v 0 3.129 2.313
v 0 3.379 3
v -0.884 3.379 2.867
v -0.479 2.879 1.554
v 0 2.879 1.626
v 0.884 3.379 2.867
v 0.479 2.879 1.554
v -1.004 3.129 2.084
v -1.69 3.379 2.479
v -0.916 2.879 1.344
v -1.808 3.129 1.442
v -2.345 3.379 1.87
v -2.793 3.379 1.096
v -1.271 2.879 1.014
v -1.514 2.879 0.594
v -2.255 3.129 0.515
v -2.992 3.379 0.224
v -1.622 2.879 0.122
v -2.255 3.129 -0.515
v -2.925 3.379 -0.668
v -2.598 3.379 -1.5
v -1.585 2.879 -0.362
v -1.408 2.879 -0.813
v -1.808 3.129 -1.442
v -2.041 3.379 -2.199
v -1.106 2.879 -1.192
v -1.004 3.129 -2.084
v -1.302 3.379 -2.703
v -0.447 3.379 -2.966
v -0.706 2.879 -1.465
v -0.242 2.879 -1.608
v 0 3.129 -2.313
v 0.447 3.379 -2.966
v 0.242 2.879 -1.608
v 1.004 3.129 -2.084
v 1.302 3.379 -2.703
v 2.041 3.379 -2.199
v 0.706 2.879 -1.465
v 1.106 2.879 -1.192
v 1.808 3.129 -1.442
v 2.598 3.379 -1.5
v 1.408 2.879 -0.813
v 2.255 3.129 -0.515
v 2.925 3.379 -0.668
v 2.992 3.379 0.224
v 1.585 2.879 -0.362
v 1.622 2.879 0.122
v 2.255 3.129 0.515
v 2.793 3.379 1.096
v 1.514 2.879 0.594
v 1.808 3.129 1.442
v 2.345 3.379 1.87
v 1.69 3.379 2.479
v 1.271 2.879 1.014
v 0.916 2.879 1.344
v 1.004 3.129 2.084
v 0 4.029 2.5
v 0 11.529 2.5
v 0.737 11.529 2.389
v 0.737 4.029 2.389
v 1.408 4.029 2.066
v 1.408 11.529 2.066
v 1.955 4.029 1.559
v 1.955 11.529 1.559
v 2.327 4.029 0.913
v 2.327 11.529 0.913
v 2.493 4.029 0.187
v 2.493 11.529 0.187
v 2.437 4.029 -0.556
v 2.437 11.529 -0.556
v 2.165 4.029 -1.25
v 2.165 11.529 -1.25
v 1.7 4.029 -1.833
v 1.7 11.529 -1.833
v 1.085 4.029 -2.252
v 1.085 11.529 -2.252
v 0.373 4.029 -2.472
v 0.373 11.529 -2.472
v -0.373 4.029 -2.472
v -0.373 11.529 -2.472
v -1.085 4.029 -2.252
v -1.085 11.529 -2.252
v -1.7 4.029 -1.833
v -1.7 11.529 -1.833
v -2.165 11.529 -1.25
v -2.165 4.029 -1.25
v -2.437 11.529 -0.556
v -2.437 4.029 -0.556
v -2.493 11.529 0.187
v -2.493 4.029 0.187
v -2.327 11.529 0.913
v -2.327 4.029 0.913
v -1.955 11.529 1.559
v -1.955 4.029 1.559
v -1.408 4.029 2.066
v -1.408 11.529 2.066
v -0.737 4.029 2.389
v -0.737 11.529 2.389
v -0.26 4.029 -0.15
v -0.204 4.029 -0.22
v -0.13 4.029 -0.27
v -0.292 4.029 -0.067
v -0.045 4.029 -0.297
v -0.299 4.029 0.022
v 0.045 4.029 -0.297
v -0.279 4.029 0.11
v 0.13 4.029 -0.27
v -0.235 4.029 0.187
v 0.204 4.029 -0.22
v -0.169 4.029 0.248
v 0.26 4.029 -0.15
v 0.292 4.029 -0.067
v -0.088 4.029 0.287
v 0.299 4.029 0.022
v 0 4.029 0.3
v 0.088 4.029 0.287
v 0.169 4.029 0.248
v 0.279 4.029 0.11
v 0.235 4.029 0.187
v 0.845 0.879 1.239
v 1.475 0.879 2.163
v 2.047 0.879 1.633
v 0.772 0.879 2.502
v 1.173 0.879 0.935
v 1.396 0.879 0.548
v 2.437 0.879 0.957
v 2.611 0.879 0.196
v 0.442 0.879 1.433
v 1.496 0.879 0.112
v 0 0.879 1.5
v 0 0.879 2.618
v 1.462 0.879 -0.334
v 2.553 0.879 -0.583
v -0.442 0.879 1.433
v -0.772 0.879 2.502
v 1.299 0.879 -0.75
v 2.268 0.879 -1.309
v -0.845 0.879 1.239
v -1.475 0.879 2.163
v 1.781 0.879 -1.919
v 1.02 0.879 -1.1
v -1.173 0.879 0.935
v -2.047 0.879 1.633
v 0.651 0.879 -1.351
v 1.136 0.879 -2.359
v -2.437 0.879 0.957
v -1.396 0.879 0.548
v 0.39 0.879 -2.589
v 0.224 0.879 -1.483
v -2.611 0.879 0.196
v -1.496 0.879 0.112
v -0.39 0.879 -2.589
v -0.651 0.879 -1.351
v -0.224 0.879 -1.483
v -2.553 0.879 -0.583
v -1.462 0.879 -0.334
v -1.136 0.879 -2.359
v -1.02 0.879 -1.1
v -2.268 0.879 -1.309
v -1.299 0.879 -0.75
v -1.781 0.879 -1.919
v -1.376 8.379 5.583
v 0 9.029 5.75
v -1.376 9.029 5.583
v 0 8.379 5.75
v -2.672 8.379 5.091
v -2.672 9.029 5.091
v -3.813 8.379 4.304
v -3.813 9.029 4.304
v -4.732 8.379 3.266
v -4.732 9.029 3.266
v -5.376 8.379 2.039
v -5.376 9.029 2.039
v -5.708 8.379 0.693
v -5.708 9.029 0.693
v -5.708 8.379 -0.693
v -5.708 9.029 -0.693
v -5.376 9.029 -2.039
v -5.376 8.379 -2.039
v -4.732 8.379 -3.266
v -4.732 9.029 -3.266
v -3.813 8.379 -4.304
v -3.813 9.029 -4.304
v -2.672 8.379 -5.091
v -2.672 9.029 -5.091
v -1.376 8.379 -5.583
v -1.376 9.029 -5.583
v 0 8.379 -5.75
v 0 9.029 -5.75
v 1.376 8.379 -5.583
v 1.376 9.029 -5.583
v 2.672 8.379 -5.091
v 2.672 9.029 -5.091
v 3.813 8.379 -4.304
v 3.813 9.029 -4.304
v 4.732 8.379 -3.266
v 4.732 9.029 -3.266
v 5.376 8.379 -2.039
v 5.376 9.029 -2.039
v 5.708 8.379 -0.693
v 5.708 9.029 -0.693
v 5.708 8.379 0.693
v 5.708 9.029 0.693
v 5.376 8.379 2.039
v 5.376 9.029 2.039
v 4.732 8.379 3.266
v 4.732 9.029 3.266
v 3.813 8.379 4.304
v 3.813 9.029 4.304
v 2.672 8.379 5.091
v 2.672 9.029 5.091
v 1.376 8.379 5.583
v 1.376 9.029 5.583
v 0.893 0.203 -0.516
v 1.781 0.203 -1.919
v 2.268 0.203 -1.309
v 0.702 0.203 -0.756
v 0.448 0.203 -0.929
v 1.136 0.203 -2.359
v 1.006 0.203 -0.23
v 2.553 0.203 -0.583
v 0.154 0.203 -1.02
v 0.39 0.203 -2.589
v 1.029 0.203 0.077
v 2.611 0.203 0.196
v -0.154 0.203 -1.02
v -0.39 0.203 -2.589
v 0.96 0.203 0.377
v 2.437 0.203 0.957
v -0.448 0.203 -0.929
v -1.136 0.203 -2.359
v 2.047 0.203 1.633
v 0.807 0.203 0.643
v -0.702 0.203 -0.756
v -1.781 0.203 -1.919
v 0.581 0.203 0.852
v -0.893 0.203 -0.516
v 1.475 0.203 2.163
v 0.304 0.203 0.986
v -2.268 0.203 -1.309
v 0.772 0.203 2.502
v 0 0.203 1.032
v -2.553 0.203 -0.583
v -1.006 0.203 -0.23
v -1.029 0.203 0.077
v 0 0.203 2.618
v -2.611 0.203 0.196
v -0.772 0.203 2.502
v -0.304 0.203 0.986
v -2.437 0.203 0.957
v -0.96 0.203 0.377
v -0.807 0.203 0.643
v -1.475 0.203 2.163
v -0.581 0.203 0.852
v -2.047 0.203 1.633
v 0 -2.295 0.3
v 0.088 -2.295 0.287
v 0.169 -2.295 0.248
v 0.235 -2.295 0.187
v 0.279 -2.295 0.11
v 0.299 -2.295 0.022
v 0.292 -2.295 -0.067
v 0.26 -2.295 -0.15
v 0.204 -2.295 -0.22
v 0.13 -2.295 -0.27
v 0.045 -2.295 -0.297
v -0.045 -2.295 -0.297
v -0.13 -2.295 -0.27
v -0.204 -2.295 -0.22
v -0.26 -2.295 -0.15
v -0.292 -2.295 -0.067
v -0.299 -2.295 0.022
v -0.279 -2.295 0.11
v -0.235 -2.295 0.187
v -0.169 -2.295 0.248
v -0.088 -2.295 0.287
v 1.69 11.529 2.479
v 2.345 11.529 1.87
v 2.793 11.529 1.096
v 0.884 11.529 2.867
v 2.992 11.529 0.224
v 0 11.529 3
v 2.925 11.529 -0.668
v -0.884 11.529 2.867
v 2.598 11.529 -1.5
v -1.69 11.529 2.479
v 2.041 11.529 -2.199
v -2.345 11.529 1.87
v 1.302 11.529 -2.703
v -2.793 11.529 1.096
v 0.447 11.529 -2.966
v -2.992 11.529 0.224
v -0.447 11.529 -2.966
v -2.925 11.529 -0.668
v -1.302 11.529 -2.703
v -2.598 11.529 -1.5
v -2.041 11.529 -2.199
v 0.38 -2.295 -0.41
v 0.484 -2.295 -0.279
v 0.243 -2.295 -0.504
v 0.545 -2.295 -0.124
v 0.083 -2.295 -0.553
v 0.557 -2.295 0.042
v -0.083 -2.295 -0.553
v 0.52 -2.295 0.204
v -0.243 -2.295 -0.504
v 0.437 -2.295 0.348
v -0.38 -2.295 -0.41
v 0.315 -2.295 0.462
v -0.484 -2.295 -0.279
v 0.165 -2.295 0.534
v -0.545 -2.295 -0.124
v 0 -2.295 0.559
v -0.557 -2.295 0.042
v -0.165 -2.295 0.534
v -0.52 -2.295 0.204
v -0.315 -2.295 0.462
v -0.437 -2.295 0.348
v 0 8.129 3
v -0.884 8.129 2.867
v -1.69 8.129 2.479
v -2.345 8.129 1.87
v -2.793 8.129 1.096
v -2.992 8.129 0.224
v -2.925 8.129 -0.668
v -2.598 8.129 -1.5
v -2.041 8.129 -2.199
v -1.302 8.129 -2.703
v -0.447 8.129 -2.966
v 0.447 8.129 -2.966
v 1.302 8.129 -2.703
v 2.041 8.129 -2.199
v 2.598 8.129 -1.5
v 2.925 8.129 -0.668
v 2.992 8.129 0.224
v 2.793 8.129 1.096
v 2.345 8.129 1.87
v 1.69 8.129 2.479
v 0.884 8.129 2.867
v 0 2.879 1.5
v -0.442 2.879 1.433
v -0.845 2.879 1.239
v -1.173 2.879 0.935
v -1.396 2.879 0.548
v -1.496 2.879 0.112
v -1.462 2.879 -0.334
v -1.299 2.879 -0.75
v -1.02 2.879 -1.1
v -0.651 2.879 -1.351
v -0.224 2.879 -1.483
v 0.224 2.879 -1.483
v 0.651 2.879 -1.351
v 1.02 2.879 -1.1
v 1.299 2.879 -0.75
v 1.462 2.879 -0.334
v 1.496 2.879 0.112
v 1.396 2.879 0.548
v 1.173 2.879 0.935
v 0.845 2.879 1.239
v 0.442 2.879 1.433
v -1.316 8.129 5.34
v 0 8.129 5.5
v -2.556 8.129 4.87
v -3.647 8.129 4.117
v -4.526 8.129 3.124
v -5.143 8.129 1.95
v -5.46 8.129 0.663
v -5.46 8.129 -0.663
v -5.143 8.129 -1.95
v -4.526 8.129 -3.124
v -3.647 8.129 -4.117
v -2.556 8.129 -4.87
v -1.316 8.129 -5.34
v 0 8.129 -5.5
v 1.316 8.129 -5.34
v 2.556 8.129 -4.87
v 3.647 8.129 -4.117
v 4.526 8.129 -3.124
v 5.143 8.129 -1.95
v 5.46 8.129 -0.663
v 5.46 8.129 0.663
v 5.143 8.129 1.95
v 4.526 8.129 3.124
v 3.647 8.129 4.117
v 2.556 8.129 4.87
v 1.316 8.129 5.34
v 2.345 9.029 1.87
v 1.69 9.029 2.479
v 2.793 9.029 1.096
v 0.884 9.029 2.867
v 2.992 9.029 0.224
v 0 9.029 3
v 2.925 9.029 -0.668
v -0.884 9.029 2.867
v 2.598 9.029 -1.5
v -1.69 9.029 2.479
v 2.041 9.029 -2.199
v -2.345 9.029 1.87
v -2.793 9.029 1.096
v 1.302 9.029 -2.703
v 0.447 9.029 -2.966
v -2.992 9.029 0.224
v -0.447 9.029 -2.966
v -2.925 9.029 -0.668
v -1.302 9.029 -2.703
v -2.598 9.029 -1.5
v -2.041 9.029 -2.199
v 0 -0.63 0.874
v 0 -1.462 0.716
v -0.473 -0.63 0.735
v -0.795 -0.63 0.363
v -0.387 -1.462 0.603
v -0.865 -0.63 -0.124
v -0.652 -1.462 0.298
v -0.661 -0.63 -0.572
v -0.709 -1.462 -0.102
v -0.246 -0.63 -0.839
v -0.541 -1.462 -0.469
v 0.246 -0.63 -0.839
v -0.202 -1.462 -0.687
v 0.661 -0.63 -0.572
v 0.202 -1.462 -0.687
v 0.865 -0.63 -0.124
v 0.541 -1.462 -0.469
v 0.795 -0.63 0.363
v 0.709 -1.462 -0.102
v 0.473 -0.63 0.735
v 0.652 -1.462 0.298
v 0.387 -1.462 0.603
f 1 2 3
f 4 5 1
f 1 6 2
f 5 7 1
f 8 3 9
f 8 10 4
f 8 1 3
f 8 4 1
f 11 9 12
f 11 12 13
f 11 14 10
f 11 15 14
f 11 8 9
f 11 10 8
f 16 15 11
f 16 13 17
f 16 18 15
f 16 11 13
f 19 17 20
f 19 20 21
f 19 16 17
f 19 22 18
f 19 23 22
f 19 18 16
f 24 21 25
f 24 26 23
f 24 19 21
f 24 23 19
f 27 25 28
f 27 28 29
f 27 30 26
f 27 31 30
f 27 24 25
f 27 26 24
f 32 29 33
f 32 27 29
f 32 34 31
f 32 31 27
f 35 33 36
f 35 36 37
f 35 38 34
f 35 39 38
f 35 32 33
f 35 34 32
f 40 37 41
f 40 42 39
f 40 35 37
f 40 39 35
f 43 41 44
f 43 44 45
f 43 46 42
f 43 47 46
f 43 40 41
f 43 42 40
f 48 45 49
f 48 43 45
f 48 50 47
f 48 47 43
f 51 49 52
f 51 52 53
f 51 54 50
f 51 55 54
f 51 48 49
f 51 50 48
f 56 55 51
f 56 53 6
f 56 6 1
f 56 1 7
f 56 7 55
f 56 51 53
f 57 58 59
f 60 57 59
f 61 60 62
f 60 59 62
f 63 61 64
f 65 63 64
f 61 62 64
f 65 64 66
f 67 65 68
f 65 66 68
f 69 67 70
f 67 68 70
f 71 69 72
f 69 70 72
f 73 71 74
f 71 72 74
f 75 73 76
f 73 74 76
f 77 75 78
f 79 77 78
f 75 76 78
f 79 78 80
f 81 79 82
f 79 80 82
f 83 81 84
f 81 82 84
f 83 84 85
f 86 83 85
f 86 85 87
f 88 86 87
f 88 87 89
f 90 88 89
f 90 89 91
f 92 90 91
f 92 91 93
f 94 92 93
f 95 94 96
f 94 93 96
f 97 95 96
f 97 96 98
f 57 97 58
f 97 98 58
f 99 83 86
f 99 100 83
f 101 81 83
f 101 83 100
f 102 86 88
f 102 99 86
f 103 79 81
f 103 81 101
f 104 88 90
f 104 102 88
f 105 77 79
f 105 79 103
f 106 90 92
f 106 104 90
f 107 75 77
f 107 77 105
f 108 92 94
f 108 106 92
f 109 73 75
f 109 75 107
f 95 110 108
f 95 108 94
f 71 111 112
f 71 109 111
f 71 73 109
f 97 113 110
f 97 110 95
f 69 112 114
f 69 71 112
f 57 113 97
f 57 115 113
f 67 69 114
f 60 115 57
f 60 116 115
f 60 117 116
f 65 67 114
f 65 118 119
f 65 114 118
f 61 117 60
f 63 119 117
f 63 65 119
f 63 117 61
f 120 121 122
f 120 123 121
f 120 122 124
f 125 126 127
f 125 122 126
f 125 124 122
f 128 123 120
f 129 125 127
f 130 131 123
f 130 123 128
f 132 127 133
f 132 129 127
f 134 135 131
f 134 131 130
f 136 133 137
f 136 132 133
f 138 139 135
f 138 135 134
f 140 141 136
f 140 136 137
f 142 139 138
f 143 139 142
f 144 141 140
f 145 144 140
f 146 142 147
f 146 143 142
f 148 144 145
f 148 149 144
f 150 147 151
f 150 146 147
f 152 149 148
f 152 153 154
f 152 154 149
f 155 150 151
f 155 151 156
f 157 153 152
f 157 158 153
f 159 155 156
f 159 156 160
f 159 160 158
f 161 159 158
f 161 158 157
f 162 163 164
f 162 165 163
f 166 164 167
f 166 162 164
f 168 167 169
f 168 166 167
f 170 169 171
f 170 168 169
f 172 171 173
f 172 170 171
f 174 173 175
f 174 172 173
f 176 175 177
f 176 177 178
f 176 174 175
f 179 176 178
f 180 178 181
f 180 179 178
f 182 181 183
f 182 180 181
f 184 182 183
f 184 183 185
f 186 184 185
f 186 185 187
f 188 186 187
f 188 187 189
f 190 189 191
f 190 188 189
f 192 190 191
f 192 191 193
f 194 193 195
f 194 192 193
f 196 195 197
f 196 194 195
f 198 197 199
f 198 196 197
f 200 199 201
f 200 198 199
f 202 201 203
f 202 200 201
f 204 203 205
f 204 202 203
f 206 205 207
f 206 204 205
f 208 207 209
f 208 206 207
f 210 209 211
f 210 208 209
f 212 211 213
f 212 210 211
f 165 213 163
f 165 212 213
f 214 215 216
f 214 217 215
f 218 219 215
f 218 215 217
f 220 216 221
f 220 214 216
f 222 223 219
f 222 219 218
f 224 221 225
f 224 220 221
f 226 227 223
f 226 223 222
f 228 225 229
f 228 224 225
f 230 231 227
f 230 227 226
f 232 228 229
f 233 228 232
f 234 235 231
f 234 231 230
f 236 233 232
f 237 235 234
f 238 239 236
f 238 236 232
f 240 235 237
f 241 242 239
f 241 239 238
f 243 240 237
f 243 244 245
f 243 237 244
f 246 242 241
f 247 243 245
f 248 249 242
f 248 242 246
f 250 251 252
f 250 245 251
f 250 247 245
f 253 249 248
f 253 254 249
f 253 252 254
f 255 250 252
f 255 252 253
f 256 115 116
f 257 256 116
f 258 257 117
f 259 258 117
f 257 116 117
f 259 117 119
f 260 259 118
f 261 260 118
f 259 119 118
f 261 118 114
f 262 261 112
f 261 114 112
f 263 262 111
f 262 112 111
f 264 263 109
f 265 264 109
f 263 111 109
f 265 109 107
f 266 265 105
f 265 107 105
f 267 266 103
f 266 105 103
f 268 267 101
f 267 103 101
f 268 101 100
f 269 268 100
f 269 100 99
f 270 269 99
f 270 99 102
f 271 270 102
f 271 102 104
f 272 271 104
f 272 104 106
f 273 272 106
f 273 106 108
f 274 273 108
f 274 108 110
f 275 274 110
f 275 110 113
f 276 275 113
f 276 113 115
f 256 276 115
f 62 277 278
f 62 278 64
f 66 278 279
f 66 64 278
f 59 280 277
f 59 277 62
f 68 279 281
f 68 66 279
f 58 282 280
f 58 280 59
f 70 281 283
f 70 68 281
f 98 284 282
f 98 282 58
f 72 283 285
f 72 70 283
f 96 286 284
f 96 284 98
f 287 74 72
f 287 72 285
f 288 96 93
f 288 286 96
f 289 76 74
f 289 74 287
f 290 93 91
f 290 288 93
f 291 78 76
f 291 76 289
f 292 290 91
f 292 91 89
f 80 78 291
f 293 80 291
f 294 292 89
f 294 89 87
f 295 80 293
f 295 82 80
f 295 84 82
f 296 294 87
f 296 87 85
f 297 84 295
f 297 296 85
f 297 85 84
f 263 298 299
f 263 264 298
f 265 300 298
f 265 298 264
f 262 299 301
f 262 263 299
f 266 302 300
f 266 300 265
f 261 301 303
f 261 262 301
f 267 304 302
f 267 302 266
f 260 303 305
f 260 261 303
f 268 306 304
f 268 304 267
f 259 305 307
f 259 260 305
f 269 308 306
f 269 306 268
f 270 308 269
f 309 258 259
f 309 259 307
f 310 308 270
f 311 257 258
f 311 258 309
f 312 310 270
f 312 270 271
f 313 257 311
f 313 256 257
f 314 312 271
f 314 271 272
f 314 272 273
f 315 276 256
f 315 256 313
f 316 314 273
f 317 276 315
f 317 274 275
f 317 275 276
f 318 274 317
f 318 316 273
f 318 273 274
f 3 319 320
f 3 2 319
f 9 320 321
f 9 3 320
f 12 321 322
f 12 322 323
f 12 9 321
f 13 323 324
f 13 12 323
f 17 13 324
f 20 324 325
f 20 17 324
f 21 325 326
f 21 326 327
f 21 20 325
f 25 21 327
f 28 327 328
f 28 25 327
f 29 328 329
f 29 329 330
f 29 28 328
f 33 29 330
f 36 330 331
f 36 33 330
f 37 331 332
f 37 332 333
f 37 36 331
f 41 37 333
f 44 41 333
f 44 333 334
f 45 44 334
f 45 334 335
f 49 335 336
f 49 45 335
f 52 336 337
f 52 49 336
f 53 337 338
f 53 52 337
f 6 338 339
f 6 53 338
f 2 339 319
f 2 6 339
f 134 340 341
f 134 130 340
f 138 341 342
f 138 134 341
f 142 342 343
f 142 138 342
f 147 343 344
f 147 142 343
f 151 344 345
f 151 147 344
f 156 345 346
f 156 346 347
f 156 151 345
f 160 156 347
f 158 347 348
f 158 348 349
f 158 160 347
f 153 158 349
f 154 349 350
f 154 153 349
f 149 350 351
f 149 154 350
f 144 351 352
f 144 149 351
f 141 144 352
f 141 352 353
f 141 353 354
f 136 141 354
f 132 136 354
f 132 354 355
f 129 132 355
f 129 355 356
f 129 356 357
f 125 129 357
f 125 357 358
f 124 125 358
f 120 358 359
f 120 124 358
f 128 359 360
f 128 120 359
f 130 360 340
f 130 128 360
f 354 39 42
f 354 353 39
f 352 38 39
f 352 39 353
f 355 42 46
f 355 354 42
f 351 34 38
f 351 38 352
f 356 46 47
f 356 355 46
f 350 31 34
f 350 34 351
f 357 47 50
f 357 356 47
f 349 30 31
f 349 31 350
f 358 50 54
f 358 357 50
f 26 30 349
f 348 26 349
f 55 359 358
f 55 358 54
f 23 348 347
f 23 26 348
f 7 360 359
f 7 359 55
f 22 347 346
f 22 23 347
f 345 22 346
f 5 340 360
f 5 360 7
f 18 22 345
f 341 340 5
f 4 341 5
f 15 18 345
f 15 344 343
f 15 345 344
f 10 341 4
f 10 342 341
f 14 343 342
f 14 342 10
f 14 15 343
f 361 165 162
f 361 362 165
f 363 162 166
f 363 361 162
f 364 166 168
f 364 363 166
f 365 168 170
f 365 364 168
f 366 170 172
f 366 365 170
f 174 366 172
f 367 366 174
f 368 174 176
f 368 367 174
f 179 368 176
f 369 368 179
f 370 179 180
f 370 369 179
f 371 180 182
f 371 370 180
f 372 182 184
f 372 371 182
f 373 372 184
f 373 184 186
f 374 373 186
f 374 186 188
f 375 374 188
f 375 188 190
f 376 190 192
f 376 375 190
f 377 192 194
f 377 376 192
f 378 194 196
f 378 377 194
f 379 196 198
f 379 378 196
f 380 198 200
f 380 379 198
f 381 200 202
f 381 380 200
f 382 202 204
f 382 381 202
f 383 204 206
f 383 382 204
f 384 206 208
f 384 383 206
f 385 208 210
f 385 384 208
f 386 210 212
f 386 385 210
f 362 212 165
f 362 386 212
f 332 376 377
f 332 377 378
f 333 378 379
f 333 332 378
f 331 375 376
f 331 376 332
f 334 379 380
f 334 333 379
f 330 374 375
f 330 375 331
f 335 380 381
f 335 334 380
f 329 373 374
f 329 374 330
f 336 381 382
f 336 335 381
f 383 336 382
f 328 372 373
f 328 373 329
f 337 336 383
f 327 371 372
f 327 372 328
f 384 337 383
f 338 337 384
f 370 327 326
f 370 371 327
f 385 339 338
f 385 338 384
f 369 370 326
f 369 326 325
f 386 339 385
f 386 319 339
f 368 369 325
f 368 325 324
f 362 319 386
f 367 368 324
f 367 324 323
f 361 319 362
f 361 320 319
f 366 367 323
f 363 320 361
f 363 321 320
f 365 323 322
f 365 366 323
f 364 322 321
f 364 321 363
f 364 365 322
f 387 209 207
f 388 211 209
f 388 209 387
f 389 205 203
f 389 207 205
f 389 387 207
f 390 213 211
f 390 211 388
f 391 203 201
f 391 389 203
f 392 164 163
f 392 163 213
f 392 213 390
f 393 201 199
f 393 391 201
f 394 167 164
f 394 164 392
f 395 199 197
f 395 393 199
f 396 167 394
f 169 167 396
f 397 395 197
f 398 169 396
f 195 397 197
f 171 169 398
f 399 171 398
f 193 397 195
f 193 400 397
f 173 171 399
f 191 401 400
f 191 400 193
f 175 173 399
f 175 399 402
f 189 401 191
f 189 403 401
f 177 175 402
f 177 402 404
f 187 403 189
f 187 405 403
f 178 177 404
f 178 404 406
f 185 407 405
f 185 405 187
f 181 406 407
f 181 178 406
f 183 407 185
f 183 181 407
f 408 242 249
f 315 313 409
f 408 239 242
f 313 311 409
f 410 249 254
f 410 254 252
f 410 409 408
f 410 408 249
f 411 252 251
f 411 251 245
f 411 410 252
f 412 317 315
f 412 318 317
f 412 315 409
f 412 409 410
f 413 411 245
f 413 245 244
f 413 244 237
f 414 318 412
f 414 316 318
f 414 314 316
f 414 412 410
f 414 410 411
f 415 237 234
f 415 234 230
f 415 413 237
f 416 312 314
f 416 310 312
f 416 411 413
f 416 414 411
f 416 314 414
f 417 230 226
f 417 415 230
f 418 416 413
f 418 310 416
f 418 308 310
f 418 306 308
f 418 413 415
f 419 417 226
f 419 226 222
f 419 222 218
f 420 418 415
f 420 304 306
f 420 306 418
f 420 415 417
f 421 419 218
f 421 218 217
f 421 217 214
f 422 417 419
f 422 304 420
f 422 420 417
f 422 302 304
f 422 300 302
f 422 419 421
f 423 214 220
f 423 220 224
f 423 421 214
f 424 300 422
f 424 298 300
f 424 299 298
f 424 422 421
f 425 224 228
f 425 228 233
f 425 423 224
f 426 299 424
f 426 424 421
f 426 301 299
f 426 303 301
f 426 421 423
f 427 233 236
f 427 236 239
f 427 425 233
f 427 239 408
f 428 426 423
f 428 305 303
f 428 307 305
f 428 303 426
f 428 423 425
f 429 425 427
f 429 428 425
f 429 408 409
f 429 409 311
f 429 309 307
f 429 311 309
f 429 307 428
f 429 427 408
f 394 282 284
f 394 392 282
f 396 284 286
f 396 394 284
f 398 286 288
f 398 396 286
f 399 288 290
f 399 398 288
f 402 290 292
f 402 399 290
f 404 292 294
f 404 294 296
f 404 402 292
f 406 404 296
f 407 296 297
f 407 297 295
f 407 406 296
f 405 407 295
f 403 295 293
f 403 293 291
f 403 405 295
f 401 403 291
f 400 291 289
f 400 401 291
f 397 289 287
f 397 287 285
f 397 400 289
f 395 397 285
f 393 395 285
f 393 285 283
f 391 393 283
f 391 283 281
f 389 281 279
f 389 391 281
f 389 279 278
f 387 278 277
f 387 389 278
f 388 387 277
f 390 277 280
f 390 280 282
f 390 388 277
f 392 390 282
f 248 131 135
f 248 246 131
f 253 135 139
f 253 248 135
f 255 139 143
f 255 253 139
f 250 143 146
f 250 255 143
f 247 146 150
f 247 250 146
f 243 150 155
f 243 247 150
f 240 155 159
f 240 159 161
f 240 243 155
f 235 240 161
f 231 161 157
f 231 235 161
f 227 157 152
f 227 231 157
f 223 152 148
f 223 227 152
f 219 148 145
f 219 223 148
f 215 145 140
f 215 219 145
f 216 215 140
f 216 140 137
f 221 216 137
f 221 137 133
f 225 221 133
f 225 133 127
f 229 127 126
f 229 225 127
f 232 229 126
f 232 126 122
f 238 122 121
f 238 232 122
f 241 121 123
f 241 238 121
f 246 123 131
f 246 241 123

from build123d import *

# Parameters (mm, degrees)
SKETCH2_R          = 0.3
CUT_EXTRUDE1_DEPTH = 17.038105375
SKETCH2_3_R        = 2.5
SKETCH2_3_R_2      = 0.3
CUT_EXTRUDE2_DEPTH = 7.5


with BuildPart() as part:
    # Sketch1 → Revolve1 (revolve)
    with BuildSketch(Plane.XY, mode=Mode.PRIVATE) as revolve1_sk:
        Polygon((-3, 11.528571429), (-3, 9.028571429), (-5.75, 9.028571429), (-5.75, 8.378571429), (-5.5, 8.128571429), (-3, 8.128571429), (-3, 3.378571429), (-1.62626129, 2.878571429), (-1.5, 2.878571429), (-1.5, 0.878571429), (-2.618482429, 0.878571429), (-2.618482429, 0.203307318), (-1.03161177, 0.203307318), (-0.558926893, -2.29516989), (0, -2.29516989), (0, 11.528571429), align=None)
    revolve(revolve1_sk.sketch.rotate(Axis((0, 11.528571429, 0), (0, -1, 0)), 270), axis=Axis((0, 11.528571429, 0), (0, -1, 0)))

    # Sketch2 → Cut-Extrude1 (cut, through all)
    with BuildSketch(Plane(origin=(0, 11.528571429, 0), x_dir=(1, 0, 0), z_dir=(0, 1, 0))):
        with Locations(Location((0, 0, 0), (0, 0, 270))):
            Circle(SKETCH2_R)
    extrude(amount=-CUT_EXTRUDE1_DEPTH, mode=Mode.SUBTRACT)

    # Sketch2<3> → Cut-Extrude2 (cut)
    with BuildSketch(Plane(origin=(0, 11.528571429, 0), x_dir=(1, 0, 0), z_dir=(0, 1, 0))):
        with Locations(Location((0, 0, 0), (0, 0, 270))):
            Circle(SKETCH2_3_R)
        with Locations(Location((0, 0, 0), (0, 0, 270))):
            Circle(SKETCH2_3_R_2, mode=Mode.SUBTRACT)
    extrude(amount=-CUT_EXTRUDE2_DEPTH, mode=Mode.SUBTRACT)


solid = part.part
